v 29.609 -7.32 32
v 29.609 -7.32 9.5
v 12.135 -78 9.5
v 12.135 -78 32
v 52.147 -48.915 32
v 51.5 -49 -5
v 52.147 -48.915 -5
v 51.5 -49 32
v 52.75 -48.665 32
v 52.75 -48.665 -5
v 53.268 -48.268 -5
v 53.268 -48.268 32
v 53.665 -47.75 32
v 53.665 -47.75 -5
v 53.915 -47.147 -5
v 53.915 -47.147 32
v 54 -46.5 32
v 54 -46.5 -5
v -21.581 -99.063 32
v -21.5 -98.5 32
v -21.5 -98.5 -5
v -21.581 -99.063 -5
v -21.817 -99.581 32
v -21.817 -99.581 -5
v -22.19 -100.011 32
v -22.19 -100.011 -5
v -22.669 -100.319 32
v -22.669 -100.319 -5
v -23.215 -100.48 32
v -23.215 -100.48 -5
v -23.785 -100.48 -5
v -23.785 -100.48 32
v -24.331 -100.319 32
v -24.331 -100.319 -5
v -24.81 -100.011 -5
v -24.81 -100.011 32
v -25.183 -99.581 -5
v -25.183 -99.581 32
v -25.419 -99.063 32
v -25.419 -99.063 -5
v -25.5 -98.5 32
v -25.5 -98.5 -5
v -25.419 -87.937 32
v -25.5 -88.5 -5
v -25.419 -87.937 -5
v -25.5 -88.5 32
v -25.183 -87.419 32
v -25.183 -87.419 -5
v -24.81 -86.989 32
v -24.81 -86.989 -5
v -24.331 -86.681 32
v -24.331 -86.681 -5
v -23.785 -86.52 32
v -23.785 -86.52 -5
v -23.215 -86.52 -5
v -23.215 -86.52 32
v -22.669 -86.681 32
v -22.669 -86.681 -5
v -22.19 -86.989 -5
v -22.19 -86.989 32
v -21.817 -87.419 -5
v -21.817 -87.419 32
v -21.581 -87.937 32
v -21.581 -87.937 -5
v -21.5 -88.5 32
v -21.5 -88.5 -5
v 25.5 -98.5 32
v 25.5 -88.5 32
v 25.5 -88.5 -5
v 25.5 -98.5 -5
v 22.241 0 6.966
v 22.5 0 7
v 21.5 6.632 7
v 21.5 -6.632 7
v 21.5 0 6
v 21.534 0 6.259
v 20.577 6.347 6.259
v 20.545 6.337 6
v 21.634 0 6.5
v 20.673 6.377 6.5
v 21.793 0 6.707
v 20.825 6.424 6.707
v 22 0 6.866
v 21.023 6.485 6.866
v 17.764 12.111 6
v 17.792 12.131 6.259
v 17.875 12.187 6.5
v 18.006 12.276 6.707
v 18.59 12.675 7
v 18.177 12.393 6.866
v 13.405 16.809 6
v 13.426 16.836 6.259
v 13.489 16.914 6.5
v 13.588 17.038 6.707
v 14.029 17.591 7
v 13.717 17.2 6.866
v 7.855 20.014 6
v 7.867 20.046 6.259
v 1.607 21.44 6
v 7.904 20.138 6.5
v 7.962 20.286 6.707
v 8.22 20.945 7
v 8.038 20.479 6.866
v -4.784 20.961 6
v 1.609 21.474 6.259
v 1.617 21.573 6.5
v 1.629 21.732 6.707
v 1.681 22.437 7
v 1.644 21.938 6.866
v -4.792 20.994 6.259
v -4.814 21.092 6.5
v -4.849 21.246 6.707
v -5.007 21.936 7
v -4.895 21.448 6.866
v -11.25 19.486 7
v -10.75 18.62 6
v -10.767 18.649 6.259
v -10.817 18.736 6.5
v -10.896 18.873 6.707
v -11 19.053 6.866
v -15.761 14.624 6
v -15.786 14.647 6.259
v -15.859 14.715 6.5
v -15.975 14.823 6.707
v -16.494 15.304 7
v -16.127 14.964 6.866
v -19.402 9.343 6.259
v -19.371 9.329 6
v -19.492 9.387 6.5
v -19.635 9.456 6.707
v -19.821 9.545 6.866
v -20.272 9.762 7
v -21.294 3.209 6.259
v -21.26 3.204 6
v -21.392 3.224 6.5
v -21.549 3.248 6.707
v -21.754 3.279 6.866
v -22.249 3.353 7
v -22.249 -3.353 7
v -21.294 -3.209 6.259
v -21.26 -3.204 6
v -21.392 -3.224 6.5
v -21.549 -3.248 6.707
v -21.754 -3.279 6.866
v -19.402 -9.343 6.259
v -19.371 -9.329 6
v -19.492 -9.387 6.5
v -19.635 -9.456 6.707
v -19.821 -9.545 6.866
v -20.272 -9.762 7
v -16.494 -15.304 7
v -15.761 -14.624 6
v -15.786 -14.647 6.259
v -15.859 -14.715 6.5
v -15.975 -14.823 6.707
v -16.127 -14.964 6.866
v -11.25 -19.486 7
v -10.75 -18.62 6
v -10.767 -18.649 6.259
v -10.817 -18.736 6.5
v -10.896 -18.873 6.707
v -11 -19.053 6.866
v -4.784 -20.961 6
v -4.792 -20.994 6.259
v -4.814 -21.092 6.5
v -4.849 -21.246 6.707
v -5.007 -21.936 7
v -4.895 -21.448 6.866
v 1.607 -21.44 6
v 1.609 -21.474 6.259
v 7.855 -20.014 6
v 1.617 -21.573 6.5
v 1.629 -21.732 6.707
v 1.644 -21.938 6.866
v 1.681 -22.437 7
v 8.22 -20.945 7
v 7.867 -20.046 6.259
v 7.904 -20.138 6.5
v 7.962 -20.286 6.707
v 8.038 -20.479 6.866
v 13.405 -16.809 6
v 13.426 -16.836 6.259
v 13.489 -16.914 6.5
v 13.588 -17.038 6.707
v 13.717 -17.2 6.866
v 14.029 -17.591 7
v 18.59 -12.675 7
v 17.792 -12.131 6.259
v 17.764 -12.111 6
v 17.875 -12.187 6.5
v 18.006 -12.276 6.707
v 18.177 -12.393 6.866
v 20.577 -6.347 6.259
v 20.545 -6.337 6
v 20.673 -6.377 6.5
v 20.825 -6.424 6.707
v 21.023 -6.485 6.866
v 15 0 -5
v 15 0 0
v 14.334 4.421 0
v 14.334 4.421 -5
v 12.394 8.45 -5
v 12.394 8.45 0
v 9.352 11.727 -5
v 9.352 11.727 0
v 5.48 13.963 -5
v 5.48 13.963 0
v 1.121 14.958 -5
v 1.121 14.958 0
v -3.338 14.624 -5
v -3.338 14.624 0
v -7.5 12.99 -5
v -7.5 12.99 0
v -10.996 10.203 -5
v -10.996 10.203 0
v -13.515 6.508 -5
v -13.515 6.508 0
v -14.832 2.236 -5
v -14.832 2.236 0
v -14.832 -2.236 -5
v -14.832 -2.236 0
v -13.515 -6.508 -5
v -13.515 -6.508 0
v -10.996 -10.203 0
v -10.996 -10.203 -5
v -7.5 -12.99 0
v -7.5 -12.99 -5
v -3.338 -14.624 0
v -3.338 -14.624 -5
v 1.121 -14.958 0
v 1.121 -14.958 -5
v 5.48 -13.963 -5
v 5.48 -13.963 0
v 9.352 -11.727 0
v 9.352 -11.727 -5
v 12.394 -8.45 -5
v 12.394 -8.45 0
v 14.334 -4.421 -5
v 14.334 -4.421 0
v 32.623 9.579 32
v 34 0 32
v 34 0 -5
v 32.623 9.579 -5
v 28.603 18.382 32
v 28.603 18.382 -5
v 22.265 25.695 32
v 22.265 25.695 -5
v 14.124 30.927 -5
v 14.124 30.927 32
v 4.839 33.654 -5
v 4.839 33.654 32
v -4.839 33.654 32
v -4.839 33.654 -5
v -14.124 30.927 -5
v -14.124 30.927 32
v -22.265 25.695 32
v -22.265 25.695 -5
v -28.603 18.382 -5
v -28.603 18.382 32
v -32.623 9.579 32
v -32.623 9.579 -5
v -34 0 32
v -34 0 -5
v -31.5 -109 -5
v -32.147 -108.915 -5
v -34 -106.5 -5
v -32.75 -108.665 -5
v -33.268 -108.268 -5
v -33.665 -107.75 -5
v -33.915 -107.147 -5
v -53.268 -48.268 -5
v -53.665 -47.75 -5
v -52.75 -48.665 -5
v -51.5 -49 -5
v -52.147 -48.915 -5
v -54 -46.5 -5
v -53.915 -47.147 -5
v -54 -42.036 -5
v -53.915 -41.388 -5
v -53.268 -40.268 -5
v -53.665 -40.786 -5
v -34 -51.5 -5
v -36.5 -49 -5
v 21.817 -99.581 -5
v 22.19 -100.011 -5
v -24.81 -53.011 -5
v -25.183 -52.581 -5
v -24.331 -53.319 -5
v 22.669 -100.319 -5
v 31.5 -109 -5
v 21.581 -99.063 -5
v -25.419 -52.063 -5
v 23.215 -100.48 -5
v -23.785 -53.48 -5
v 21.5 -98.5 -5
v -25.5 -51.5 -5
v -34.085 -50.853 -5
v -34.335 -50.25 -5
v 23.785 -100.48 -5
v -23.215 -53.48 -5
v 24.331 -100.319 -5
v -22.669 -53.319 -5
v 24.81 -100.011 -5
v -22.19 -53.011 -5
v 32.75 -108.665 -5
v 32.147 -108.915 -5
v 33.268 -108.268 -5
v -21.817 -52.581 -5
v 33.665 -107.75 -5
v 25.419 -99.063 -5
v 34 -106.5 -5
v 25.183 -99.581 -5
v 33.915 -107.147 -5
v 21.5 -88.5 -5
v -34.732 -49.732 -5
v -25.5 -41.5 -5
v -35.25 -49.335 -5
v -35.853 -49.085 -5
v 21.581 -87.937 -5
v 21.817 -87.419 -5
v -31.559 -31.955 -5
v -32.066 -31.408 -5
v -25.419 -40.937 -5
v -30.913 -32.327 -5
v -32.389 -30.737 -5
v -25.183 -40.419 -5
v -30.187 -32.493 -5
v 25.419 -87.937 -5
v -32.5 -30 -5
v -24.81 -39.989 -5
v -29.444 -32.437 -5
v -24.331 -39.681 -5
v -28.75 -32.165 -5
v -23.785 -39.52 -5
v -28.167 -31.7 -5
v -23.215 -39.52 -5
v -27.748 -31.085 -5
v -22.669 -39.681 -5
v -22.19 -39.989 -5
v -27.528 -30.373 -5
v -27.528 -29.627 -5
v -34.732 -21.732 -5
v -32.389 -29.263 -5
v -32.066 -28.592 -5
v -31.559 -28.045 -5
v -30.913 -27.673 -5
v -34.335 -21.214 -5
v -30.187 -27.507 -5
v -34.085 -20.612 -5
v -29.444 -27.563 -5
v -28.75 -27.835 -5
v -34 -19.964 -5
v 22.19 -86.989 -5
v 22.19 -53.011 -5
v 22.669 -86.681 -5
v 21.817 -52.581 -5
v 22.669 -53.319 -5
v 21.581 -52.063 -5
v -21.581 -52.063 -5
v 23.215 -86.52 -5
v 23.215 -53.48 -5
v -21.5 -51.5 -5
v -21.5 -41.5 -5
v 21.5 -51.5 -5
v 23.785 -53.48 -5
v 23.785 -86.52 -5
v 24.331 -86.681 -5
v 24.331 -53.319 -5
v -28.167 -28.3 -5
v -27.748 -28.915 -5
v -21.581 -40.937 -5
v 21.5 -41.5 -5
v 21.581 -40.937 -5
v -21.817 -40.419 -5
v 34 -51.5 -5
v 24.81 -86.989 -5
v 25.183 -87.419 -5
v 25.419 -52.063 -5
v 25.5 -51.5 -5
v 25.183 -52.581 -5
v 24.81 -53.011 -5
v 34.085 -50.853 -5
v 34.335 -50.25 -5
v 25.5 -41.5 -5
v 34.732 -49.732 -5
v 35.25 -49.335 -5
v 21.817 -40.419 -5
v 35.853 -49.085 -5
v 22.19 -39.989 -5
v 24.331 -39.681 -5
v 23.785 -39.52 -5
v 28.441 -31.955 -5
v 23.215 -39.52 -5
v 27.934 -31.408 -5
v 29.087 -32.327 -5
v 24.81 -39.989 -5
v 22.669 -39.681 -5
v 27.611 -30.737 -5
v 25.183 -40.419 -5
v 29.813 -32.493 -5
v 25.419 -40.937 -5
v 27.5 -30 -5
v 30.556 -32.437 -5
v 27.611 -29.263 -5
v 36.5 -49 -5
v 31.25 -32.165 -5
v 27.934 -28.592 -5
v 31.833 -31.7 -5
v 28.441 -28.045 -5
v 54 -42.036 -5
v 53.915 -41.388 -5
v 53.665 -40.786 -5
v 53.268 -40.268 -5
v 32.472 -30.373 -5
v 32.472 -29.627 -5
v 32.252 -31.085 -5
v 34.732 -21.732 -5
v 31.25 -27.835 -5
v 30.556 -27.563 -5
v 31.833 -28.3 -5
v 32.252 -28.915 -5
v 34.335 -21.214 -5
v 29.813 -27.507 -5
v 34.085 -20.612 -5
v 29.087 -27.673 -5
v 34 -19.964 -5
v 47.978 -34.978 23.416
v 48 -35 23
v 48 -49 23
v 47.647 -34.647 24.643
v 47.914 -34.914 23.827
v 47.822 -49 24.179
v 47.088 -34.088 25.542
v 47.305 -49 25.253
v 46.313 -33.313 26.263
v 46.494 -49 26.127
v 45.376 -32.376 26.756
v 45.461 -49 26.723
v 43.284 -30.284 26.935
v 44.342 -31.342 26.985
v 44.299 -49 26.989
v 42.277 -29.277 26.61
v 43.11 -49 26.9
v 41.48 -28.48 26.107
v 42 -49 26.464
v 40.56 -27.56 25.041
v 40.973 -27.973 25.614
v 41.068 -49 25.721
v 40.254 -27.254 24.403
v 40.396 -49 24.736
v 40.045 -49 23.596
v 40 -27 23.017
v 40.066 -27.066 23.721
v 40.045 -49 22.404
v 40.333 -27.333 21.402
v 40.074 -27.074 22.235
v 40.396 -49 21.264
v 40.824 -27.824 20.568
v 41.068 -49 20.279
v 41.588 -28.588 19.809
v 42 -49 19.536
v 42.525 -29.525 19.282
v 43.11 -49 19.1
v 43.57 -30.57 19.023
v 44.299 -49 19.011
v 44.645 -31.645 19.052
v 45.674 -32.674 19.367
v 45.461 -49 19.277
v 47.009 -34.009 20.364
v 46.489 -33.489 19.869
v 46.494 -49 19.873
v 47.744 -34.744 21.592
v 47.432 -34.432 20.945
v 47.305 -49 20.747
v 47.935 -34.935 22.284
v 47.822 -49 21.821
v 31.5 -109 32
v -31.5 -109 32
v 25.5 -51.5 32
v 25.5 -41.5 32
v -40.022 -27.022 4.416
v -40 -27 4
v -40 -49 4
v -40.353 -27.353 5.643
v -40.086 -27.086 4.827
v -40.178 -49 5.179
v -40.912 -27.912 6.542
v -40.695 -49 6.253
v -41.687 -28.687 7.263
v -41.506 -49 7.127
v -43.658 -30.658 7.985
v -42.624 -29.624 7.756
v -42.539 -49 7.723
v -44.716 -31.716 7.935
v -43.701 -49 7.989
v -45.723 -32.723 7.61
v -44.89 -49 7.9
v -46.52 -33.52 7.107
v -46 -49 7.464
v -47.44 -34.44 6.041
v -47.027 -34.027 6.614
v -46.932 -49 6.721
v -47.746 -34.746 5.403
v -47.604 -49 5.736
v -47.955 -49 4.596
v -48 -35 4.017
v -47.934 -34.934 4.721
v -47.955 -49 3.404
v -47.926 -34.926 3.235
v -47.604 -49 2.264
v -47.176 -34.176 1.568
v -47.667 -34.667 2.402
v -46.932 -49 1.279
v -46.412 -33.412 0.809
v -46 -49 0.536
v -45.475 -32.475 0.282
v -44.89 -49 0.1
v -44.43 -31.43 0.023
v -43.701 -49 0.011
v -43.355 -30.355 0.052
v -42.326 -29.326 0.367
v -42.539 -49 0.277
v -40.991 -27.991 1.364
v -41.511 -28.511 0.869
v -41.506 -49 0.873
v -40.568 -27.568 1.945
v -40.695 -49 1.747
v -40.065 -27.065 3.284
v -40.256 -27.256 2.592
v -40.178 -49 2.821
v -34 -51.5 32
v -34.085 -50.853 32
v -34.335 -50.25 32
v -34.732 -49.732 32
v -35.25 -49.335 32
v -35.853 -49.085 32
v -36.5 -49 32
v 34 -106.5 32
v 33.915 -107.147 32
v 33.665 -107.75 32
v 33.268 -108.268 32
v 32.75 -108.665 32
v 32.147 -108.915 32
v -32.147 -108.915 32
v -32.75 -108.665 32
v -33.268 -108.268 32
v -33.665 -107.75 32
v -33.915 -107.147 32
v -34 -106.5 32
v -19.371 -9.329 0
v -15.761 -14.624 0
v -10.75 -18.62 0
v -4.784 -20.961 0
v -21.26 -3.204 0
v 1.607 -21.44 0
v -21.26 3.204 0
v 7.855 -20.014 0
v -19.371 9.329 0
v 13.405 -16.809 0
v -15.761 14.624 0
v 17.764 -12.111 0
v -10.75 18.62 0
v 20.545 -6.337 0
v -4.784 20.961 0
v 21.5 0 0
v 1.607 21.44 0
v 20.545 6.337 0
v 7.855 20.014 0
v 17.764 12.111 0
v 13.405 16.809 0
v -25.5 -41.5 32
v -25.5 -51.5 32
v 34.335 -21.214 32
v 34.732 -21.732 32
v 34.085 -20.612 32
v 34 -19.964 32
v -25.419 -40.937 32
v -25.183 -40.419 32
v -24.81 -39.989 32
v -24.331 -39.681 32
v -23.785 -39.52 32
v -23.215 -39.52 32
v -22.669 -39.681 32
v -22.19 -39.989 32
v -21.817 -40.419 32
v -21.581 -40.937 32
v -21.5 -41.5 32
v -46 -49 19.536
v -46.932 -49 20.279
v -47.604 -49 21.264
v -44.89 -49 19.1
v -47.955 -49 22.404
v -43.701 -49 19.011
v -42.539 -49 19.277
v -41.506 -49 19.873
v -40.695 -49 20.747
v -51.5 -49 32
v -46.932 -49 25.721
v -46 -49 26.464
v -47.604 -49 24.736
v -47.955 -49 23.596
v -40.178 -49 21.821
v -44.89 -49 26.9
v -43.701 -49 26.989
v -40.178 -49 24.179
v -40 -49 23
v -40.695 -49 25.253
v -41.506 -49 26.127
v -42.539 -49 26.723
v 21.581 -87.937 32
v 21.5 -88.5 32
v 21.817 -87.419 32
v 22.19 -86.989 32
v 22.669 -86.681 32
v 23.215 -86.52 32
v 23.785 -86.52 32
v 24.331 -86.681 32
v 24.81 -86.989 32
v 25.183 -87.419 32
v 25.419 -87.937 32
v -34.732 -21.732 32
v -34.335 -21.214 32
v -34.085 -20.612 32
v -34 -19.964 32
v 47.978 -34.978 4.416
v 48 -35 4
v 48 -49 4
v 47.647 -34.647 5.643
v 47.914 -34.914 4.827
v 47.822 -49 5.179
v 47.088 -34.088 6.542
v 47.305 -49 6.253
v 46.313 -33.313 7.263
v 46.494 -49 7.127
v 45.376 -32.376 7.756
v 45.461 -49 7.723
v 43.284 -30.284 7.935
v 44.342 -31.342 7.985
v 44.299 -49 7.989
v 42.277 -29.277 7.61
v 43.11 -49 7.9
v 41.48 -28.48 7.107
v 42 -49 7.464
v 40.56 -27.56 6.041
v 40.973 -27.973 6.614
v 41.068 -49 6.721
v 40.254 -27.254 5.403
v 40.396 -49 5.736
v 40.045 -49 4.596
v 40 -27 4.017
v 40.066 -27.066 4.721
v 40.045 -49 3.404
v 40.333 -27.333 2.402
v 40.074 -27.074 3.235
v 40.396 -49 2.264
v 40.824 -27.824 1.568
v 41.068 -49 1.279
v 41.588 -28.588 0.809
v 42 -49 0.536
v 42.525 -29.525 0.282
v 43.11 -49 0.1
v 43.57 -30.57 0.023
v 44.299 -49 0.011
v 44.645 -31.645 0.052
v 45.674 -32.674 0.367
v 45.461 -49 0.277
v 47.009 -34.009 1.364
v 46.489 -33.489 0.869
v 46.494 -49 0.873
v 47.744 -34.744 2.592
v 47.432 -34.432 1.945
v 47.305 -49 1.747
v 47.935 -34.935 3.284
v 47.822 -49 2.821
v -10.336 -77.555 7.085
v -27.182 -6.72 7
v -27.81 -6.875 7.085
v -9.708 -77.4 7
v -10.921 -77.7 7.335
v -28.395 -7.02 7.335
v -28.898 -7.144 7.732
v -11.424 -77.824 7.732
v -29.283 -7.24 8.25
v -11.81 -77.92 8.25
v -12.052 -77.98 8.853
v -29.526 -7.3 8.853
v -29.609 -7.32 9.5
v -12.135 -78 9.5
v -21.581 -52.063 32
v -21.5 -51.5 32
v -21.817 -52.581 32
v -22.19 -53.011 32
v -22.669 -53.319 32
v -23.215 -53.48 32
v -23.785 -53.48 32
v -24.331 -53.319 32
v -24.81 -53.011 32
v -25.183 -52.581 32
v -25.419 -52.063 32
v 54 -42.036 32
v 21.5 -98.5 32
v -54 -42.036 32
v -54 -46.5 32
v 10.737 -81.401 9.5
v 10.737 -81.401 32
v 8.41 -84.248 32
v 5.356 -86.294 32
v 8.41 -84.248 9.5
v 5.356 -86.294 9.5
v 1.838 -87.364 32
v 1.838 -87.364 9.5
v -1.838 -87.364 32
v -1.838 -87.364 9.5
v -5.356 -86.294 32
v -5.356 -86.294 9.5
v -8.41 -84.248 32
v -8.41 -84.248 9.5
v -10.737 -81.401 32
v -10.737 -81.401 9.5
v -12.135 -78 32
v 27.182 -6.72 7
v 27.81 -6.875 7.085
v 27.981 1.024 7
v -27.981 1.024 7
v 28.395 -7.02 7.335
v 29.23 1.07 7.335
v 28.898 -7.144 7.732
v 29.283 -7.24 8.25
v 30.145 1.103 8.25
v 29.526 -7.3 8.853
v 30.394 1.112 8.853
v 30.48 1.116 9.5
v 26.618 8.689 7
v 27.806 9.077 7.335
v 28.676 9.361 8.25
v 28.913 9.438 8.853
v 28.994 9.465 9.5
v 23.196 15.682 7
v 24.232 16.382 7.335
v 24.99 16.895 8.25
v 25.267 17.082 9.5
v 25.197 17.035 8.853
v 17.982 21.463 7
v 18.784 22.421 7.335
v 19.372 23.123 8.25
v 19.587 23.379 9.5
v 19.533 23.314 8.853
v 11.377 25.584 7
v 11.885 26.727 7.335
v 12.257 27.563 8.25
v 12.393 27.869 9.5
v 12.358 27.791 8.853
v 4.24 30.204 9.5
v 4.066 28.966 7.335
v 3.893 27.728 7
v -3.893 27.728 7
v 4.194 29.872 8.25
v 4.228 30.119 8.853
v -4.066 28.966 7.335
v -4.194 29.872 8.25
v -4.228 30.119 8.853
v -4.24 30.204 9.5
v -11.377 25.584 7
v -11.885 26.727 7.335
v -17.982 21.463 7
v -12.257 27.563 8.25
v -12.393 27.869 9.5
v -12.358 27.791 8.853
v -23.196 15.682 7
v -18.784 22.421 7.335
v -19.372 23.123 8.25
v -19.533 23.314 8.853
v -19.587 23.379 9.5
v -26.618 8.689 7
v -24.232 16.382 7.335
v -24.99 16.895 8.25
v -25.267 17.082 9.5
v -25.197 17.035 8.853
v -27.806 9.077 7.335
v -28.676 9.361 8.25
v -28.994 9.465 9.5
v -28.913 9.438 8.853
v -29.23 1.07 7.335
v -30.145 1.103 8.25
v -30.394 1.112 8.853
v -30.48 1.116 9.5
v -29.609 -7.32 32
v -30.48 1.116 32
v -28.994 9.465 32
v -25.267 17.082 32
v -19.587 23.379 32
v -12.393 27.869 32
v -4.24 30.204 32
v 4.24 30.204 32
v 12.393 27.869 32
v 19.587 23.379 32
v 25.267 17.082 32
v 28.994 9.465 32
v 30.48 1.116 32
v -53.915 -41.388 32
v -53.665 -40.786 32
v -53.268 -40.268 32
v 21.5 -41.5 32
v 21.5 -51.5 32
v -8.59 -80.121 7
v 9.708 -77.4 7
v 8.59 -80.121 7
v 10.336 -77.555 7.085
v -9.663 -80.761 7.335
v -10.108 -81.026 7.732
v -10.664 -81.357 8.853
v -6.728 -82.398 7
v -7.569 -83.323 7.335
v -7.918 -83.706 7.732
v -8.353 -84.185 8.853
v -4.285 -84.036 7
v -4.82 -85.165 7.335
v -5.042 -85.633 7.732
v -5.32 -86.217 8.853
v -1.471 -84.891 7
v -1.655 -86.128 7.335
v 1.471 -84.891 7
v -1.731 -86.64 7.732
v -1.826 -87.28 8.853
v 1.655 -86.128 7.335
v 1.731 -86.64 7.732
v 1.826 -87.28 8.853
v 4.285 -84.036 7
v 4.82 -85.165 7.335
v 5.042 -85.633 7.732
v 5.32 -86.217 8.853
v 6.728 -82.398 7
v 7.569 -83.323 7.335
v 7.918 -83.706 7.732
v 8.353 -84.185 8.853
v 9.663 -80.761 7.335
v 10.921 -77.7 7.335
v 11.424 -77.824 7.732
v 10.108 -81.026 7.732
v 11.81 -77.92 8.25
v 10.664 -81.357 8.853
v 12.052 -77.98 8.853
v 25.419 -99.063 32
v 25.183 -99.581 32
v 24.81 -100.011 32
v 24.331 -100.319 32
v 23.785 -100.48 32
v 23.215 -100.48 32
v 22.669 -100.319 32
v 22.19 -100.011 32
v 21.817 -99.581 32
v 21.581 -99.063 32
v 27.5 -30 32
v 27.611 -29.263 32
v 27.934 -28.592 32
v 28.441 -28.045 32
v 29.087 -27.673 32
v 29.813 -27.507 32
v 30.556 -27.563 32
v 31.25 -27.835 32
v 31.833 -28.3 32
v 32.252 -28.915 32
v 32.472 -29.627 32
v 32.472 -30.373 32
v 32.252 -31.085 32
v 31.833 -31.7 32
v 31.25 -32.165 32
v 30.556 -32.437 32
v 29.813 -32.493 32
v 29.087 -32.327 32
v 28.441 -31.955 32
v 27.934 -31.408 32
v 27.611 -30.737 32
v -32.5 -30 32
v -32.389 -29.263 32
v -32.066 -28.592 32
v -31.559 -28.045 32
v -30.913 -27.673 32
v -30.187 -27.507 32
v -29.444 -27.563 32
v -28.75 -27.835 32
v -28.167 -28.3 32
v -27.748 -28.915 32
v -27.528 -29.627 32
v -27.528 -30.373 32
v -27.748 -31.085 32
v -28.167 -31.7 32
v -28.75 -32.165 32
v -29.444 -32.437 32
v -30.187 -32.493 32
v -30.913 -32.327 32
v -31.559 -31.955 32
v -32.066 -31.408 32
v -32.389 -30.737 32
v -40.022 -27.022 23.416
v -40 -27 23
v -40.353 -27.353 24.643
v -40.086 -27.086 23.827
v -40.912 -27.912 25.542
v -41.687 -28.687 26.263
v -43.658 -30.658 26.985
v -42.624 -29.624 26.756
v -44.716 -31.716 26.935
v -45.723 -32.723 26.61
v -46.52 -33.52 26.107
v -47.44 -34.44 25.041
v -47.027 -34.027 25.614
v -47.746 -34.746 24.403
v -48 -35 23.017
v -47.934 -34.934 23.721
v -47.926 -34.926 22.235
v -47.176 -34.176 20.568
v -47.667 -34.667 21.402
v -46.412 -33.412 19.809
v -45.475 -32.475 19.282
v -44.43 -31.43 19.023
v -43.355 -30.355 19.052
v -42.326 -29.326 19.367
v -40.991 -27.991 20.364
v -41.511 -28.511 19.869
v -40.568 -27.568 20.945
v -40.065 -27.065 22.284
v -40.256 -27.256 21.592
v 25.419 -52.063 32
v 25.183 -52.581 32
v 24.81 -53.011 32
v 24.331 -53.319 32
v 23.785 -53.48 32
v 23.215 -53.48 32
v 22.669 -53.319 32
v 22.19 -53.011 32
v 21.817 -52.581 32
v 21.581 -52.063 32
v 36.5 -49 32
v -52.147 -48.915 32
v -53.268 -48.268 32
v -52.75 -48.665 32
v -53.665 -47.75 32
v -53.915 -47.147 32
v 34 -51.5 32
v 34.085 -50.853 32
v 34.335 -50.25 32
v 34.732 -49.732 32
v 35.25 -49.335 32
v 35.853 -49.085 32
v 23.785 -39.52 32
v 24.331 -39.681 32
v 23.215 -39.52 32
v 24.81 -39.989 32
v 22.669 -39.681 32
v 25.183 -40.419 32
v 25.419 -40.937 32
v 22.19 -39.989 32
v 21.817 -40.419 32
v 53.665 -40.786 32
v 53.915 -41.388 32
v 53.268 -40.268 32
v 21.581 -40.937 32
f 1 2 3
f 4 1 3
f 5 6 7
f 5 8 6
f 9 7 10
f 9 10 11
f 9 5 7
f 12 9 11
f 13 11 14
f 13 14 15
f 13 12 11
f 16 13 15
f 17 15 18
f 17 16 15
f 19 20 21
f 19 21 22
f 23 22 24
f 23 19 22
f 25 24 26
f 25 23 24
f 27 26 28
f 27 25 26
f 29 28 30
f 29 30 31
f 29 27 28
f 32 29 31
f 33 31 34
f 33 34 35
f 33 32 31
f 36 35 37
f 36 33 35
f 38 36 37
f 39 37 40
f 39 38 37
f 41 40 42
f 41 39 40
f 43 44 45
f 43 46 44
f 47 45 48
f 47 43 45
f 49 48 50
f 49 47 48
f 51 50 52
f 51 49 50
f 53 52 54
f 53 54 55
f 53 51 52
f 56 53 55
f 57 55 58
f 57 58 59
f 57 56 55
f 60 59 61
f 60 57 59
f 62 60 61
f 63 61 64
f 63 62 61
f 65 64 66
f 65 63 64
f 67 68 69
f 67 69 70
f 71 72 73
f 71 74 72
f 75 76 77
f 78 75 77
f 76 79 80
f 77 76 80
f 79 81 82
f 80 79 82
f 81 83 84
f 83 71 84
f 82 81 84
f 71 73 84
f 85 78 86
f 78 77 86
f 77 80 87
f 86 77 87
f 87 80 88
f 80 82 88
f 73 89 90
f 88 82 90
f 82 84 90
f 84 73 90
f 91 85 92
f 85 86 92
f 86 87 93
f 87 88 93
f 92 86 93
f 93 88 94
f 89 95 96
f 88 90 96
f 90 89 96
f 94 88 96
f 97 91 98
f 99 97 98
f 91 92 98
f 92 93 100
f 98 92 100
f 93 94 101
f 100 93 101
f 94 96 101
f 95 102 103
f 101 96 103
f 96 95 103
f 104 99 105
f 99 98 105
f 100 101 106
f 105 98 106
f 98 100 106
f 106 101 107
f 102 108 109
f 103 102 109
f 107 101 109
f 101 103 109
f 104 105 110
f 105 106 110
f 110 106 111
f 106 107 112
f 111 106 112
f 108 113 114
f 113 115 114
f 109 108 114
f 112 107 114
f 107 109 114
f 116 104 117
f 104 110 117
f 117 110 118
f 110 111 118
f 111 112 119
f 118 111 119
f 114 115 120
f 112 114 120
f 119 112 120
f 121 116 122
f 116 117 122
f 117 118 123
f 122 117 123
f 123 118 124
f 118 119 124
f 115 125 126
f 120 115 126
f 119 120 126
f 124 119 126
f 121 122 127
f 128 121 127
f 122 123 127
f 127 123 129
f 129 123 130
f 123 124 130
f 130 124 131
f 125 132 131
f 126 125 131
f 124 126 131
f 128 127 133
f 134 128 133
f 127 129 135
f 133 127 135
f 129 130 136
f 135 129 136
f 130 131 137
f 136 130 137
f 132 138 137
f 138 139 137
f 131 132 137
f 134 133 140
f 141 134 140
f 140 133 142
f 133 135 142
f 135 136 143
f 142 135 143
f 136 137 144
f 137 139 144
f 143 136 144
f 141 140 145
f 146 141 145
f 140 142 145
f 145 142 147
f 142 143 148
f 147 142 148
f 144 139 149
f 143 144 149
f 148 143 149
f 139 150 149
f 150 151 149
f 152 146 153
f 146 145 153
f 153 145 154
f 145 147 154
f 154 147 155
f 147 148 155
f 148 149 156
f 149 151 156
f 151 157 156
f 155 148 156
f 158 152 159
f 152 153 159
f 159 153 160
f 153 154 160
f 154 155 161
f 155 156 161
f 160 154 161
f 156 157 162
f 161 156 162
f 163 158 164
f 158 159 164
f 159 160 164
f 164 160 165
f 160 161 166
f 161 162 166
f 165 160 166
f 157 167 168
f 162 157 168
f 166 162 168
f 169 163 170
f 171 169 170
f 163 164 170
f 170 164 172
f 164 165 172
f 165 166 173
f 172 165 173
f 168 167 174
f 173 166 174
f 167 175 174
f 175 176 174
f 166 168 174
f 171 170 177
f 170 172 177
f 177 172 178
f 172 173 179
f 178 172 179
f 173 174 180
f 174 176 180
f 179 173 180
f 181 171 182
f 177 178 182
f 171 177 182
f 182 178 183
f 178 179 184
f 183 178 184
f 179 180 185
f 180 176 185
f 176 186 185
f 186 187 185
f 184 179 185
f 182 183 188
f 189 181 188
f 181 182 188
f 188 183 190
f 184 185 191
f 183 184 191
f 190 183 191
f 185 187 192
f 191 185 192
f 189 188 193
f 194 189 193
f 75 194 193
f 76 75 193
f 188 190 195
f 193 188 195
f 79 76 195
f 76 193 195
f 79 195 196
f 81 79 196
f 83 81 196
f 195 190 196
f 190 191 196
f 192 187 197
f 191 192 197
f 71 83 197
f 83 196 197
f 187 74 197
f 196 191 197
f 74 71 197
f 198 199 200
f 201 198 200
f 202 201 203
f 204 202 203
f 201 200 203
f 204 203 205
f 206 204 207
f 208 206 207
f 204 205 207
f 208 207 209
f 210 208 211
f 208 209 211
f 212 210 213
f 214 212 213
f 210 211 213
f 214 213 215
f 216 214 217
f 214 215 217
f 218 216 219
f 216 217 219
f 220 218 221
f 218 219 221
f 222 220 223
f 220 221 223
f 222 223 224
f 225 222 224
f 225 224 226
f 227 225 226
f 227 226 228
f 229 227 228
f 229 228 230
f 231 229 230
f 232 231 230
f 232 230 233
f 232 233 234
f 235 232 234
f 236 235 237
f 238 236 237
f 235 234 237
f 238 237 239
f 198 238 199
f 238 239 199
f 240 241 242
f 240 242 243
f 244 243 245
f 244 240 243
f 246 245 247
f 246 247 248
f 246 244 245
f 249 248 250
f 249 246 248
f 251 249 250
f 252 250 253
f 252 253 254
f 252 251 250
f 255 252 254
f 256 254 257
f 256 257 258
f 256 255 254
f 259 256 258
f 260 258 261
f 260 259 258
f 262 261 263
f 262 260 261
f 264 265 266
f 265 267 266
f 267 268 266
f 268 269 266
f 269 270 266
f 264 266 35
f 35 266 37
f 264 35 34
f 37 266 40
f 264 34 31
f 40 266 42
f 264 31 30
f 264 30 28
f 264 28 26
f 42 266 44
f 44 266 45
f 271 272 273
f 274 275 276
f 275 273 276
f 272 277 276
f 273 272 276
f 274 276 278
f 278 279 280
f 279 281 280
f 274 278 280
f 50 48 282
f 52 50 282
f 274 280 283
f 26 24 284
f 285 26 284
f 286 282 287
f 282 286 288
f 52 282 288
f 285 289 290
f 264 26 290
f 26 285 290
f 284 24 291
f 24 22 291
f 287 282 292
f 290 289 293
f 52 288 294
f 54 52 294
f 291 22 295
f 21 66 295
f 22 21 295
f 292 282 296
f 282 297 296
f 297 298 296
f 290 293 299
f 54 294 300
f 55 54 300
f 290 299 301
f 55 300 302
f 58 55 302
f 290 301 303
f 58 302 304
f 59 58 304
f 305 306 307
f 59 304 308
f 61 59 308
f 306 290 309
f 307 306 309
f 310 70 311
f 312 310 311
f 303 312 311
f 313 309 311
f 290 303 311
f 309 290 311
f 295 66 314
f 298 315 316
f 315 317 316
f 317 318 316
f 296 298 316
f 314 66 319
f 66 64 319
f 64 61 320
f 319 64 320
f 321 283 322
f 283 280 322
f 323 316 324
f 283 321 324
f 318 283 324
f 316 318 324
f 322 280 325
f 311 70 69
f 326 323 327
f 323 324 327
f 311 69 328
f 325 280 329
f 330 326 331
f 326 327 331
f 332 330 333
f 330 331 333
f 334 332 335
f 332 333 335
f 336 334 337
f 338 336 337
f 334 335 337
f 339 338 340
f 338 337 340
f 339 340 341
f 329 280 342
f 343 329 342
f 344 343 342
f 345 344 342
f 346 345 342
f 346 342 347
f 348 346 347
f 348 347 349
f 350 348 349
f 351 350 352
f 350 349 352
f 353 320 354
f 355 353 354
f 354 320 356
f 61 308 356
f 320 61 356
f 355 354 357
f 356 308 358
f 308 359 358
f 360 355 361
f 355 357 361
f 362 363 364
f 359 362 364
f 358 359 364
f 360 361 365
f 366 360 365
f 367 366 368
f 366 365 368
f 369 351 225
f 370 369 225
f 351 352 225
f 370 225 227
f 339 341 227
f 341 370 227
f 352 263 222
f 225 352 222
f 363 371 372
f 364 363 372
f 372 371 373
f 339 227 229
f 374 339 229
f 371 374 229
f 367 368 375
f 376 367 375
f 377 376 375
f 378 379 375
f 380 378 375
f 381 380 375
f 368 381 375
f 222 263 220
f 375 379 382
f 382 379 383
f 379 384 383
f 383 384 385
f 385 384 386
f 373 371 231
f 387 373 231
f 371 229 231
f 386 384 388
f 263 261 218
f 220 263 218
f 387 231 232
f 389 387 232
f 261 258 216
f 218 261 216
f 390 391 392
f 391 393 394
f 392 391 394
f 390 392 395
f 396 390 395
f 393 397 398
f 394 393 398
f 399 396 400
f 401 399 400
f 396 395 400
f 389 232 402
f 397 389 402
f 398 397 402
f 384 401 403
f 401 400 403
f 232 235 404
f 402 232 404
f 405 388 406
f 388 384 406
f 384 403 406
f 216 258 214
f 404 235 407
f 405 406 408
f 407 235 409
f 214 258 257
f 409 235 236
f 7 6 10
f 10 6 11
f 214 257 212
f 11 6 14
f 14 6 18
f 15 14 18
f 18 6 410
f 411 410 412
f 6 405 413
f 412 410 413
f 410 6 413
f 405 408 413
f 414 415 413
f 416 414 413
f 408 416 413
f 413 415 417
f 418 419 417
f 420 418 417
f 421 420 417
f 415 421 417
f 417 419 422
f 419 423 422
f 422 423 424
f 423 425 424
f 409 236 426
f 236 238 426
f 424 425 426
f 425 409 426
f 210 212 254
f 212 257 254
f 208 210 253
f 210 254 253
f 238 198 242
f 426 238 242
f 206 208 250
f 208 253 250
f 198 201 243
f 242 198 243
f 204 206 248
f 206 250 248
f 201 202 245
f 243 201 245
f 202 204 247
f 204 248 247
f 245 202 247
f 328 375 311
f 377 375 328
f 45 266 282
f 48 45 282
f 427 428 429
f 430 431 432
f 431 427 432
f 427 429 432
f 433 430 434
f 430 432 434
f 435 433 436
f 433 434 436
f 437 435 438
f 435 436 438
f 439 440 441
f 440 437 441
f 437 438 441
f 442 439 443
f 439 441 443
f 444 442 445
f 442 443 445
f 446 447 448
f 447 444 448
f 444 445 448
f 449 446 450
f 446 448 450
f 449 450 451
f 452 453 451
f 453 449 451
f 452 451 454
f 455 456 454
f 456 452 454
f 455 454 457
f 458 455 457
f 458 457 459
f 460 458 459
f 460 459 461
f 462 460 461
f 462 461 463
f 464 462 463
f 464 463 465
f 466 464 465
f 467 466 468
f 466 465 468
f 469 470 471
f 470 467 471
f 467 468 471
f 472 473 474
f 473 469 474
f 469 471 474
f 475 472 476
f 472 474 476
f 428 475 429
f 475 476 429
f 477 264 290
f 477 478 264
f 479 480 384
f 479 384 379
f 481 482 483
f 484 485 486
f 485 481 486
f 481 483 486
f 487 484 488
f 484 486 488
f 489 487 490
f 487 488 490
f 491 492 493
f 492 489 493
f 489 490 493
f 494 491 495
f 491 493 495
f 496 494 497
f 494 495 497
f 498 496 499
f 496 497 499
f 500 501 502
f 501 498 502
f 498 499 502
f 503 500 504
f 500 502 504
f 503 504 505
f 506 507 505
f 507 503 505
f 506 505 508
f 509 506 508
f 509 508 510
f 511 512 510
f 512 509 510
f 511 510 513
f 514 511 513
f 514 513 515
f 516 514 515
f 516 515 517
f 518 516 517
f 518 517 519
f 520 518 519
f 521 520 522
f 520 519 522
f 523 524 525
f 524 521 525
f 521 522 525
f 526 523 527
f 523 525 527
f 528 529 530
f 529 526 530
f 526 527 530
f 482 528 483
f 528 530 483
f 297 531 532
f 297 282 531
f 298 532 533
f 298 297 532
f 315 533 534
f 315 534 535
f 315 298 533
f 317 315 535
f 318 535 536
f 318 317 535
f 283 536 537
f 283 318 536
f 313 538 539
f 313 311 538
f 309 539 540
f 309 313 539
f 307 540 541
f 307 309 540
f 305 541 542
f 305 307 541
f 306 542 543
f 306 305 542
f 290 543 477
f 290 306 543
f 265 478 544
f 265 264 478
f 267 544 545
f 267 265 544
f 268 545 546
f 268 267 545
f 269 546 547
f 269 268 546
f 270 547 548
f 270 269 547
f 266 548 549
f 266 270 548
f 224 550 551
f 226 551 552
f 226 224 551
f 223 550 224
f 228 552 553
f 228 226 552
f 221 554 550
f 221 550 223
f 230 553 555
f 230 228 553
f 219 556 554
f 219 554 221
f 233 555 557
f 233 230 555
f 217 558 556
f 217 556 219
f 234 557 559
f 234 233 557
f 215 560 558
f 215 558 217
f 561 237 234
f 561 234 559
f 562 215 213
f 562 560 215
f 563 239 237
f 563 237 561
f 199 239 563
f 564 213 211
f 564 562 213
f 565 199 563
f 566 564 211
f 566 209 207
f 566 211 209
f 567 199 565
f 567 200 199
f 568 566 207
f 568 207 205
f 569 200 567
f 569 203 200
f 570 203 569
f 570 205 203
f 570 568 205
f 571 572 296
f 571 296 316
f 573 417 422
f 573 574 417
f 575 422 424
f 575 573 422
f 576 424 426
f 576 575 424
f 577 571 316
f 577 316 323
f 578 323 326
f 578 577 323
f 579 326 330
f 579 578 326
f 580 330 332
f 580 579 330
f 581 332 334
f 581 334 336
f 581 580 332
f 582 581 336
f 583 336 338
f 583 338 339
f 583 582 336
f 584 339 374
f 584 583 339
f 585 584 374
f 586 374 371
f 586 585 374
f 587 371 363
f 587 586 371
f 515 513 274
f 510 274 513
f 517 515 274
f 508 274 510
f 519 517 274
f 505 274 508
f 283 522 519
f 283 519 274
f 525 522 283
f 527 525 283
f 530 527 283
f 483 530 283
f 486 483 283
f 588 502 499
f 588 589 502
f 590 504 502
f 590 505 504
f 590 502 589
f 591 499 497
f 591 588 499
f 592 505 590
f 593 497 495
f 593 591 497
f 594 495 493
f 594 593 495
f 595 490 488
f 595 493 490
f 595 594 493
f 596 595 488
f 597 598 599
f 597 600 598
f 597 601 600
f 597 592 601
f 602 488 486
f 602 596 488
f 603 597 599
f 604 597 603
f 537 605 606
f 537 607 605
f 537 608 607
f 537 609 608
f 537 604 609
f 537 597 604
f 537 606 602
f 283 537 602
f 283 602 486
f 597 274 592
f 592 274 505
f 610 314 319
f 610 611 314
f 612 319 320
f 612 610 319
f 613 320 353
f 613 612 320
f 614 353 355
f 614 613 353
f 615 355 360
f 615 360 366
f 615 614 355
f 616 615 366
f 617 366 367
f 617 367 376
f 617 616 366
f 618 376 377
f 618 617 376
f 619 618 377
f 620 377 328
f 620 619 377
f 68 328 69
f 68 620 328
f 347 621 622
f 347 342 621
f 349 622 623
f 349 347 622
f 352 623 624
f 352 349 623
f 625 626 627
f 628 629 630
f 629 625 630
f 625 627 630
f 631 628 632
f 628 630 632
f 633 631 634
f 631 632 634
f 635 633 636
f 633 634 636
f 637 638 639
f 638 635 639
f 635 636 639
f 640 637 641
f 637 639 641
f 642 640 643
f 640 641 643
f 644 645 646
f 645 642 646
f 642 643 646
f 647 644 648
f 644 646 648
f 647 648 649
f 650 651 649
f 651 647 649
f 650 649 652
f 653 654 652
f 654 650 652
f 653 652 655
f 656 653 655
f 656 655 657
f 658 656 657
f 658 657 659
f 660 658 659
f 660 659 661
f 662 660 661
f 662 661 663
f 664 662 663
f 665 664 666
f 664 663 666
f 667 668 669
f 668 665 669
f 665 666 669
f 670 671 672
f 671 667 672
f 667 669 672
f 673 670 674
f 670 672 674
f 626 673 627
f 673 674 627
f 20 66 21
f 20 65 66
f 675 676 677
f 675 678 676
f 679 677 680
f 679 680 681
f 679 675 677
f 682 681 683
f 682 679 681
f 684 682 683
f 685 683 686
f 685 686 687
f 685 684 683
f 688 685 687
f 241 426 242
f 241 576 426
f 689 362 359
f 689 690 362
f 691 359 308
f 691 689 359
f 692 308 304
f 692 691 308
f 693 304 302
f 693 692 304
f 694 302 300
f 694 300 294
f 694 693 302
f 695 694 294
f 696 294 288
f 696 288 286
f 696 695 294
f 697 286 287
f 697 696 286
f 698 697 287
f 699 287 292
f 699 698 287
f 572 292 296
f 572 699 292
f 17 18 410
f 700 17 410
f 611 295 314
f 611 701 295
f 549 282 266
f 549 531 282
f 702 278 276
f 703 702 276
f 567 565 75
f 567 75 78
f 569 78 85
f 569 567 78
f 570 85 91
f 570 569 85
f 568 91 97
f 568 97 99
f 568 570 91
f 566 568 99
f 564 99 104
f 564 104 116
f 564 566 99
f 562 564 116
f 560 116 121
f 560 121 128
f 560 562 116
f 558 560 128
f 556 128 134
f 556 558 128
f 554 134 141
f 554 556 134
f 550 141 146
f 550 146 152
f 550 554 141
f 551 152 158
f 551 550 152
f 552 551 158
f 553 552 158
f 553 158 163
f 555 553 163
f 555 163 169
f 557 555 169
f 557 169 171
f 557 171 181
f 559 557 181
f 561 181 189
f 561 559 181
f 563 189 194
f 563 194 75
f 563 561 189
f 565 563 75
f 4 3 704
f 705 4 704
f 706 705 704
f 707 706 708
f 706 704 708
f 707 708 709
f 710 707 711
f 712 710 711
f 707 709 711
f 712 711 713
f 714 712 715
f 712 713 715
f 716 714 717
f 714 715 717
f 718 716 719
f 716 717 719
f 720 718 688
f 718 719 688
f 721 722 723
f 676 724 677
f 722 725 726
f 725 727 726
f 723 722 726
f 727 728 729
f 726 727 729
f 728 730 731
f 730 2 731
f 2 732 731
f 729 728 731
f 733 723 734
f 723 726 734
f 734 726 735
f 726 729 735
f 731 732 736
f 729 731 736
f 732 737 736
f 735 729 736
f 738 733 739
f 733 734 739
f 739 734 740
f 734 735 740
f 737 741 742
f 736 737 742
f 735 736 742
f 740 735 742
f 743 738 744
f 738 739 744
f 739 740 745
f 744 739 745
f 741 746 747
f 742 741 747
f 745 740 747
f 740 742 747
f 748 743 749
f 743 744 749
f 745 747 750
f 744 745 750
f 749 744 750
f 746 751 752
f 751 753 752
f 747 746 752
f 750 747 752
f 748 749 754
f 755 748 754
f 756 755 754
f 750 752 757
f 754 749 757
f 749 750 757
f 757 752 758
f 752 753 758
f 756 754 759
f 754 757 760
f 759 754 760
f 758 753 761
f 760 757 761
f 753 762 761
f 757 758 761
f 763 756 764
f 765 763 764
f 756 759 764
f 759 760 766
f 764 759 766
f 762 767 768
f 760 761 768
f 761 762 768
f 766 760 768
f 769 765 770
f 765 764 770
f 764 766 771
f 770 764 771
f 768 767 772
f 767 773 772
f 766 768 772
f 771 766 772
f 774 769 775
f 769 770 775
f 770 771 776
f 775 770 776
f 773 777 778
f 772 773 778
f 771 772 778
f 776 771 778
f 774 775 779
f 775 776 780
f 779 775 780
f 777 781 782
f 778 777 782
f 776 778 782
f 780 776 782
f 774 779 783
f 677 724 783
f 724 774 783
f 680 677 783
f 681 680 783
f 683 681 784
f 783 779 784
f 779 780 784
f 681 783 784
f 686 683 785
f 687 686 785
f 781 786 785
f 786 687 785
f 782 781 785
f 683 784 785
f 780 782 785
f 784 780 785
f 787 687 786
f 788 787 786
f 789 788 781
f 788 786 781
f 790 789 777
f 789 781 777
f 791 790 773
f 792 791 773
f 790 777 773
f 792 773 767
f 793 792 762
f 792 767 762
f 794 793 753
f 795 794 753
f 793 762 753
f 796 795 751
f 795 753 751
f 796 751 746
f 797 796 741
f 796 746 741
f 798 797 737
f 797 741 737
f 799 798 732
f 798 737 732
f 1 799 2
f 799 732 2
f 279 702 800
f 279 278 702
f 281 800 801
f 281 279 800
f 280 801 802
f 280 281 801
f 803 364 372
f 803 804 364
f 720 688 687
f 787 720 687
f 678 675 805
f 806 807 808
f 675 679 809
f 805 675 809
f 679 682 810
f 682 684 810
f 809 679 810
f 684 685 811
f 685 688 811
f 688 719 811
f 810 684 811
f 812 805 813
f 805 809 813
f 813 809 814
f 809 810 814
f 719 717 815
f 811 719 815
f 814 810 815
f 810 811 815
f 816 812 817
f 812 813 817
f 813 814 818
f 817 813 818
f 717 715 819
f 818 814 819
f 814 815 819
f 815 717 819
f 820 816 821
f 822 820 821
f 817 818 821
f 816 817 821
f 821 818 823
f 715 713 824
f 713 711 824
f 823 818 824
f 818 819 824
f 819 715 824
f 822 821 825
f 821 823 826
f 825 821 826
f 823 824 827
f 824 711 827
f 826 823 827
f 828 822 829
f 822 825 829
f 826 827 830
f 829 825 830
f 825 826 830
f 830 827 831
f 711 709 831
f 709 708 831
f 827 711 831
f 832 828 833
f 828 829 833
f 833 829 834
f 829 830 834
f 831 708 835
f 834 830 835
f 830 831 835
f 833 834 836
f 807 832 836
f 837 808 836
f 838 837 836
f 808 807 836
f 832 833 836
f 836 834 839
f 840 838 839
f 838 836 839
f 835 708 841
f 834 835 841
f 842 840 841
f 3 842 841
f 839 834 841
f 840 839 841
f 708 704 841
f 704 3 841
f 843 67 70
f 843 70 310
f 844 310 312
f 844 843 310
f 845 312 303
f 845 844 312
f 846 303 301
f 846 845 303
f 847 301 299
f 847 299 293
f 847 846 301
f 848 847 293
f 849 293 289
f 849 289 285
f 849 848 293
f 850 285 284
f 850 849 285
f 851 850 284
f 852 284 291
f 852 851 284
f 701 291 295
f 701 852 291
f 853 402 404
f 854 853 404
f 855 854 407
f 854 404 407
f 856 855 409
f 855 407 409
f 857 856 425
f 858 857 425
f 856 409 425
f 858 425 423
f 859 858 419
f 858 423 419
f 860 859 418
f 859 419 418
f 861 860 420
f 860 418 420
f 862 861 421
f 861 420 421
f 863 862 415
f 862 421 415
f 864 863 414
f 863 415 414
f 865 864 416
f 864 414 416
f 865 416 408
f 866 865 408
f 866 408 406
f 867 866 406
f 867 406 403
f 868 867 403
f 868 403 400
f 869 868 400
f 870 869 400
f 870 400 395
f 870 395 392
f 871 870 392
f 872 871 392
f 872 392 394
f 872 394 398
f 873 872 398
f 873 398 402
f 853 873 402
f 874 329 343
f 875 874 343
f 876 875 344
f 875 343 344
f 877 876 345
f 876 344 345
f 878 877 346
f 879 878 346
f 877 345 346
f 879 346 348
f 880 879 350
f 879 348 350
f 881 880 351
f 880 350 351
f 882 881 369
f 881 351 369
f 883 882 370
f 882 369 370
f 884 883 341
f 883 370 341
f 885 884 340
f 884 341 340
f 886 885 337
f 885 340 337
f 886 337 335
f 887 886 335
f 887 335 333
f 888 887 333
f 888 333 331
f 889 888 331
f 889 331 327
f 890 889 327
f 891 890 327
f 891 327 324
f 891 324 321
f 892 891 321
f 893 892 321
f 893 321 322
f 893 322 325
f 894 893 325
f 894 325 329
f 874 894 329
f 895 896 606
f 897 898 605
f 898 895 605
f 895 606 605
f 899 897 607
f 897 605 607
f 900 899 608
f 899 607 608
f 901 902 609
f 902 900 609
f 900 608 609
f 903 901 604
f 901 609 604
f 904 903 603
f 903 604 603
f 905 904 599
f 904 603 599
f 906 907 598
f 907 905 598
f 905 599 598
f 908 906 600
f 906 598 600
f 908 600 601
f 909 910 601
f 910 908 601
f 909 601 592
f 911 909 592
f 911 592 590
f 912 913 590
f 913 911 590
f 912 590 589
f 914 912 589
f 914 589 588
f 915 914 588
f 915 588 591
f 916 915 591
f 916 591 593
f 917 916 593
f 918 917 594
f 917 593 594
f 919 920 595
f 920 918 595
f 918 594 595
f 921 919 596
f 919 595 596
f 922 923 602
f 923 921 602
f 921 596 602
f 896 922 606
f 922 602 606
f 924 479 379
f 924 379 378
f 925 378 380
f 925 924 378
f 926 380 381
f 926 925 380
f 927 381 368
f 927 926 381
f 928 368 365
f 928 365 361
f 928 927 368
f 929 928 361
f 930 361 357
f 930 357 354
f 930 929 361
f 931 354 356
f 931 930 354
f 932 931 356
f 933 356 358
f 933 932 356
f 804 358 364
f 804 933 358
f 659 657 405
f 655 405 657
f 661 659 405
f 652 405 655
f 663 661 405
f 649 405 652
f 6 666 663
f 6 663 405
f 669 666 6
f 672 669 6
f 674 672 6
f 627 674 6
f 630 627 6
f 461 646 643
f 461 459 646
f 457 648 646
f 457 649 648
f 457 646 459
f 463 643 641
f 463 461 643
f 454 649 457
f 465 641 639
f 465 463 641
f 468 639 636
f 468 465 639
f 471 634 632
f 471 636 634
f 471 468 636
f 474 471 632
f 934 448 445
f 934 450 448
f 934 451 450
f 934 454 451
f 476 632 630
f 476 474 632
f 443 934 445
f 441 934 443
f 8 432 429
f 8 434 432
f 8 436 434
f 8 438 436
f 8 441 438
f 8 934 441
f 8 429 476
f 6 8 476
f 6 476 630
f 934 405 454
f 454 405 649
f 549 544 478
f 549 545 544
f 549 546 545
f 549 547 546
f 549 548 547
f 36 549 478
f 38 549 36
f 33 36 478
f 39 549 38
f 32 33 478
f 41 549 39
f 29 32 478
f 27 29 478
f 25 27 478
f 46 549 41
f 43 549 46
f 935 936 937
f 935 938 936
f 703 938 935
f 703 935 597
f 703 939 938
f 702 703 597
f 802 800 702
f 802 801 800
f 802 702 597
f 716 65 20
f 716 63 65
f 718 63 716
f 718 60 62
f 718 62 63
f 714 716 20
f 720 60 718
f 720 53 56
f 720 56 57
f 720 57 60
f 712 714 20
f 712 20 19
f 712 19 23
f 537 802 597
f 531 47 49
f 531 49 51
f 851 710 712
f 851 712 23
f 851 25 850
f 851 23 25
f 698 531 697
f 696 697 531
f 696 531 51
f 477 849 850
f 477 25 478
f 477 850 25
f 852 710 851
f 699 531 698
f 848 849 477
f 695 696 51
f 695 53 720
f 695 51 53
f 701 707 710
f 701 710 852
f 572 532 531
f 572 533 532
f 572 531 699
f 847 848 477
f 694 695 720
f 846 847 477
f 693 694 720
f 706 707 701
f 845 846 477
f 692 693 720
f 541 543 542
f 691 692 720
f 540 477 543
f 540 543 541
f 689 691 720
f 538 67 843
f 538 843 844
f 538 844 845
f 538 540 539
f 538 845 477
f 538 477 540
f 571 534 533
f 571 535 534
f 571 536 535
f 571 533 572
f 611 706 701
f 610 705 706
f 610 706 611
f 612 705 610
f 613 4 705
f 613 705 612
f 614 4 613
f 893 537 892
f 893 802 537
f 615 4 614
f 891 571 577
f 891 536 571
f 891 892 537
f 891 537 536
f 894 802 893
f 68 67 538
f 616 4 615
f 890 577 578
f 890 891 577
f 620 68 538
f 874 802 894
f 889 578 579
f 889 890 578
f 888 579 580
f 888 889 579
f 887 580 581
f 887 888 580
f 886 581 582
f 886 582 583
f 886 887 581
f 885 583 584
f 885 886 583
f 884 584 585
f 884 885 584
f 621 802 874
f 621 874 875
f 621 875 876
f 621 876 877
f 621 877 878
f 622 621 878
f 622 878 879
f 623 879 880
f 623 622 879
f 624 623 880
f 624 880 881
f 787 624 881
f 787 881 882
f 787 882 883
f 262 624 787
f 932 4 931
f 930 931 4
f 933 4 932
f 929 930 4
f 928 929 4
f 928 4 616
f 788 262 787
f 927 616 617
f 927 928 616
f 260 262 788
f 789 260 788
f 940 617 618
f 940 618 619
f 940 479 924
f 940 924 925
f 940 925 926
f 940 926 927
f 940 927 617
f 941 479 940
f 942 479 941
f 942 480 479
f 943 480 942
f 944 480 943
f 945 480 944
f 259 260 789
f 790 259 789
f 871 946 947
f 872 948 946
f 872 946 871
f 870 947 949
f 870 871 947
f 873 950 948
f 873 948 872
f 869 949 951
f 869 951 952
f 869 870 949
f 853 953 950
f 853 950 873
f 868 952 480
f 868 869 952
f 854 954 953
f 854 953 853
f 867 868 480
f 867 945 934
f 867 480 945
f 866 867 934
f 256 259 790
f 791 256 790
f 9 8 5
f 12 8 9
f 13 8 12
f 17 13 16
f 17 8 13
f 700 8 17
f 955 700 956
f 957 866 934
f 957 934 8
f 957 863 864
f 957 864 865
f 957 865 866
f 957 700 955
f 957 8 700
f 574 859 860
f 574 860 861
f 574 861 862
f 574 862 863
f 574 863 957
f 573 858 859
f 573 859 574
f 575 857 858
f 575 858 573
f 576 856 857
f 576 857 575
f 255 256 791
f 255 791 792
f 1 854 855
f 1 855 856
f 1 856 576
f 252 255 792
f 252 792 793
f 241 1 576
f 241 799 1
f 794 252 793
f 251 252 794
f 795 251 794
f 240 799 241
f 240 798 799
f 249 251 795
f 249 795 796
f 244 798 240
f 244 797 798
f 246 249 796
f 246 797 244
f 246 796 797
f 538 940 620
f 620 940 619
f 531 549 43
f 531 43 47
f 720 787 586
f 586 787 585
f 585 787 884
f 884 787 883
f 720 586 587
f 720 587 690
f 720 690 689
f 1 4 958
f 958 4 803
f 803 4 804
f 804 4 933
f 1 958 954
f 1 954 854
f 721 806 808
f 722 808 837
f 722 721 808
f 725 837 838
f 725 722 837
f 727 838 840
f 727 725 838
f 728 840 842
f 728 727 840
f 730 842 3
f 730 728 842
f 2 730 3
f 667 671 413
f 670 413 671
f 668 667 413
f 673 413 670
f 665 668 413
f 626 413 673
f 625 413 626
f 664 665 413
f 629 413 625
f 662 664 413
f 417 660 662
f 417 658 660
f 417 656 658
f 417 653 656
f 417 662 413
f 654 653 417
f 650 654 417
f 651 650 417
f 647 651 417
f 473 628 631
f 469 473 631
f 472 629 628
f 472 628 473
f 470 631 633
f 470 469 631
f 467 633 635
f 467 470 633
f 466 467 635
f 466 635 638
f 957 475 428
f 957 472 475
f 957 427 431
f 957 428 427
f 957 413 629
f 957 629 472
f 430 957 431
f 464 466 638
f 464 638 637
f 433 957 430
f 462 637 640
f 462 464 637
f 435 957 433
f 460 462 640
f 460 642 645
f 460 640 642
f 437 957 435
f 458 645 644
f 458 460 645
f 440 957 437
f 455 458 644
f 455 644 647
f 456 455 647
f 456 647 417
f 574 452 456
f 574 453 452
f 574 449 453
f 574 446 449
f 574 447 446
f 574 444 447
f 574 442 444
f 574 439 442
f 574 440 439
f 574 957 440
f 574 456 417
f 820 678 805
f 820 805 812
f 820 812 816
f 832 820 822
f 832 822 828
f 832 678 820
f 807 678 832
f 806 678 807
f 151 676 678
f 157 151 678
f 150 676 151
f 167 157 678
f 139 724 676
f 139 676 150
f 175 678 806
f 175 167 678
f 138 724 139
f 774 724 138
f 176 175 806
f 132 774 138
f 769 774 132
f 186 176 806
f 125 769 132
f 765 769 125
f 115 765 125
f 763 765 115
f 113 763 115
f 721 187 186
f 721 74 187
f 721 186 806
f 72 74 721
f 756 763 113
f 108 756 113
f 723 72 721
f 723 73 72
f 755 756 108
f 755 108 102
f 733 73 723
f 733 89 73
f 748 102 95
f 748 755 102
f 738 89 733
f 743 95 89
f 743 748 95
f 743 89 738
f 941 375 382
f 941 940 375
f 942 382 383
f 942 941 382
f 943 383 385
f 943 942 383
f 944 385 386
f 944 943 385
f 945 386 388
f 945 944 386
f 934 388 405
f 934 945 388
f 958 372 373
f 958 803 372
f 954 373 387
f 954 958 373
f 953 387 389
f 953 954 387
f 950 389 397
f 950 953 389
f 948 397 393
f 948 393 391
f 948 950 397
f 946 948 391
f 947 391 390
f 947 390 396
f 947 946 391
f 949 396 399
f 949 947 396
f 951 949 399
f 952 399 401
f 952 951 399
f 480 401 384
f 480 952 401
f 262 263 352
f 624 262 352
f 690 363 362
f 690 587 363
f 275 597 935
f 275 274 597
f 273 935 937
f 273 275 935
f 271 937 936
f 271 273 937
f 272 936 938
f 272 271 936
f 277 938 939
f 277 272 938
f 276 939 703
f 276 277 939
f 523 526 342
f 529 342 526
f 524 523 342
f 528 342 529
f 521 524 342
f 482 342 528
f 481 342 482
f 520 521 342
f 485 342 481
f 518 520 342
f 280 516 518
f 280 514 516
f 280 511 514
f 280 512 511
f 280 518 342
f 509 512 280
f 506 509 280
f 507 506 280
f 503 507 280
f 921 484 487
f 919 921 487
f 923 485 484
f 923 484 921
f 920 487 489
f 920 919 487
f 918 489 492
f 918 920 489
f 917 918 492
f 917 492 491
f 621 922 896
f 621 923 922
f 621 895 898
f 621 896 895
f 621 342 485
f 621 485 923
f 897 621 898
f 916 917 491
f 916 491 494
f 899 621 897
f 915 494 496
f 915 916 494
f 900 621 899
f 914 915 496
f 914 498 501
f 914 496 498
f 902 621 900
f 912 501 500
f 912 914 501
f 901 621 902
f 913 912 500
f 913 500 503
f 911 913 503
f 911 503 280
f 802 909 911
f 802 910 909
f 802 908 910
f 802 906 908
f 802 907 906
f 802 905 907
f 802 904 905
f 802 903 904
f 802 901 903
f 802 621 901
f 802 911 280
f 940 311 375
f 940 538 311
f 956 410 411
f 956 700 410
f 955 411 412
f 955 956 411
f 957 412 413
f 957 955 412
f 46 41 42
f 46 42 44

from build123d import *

# Parameters (mm, degrees)
BOSS_EXTRU_1_DEPTH      = 32
ESQUISSE1_7_R           = 15
BOSS_EXTRU_3_DEPTH      = 5
ESQUISSE1_8_R           = 21.5
BOSS_EXTRU_4_DEPTH      = 7
CONG_2_R                = 1
CONG_3_R                = 2.5
ESQUISSE2_R             = 2.5
ENL_V_MAT_EXTRU_1_DEPTH = 38
CONG_4_R                = 2.5
ESQUISSE3_R             = 4
ENL_V_MAT_EXTRU_2_DEPTH = 84


with BuildPart() as part:
    # Esquisse1 → Boss.-Extru.1 (new body)
    with BuildSketch(Plane.XY):
        with BuildLine():
            Line((34, -109), (34, -49))
            Line((34, -49), (54, -49))
            Line((54, -49), (54, -41))
            Line((54, -41), (34, -21))
            Line((34, -21), (34, 0))
            ThreePointArc((34, 0), (0, 34), (-34, 0))
            Line((-34, 0), (-34, -21))
            Line((-34, -21), (-54, -41))
            Line((-54, -41), (-54, -49))
            Line((-54, -49), (-34, -49))
            Line((-34, -49), (-34, -109))
            Line((-34, -109), (34, -109))
        make_face()
        with BuildLine():
            ThreePointArc((-21.5, -98.5), (-23.5, -100.5), (-25.5, -98.5))
            Line((-25.5, -98.5), (-25.5, -88.5))
            ThreePointArc((-25.5, -88.5), (-23.5, -86.5), (-21.5, -88.5))
            Line((-21.5, -88.5), (-21.5, -98.5))
        make_face(mode=Mode.SUBTRACT)
        with BuildLine():
            Line((-25.5, -51.5), (-25.5, -41.5))
            ThreePointArc((-25.5, -41.5), (-23.5, -39.5), (-21.5, -41.5))
            Line((-21.5, -41.5), (-21.5, -51.5))
            ThreePointArc((-21.5, -51.5), (-23.5, -53.5), (-25.5, -51.5))
        make_face(mode=Mode.SUBTRACT)
        with BuildLine():
            Line((25.5, -88.5), (25.5, -98.5))
            ThreePointArc((25.5, -98.5), (23.5, -100.5), (21.5, -98.5))
            Line((21.5, -98.5), (21.5, -88.5))
            ThreePointArc((21.5, -88.5), (23.5, -86.5), (25.5, -88.5))
        make_face(mode=Mode.SUBTRACT)
        with BuildLine():
            Line((21.5, -51.5), (21.5, -41.5))
            ThreePointArc((21.5, -41.5), (23.5, -39.5), (25.5, -41.5))
            Line((25.5, -41.5), (25.5, -51.5))
            ThreePointArc((25.5, -51.5), (23.5, -53.5), (21.5, -51.5))
        make_face(mode=Mode.SUBTRACT)
        with BuildLine():
            ThreePointArc((-29.608573083, -7.32), (0, 30.5), (29.608573083, -7.32))
            Line((29.608573083, -7.32), (12.1346611, -78))
            ThreePointArc((12.1346611, -78), (0, -87.5), (-12.1346611, -78))
            Line((-12.1346611, -78), (-29.608573083, -7.32))
        make_face(mode=Mode.SUBTRACT)
    extrude(amount=BOSS_EXTRU_1_DEPTH)

    # Esquisse1<7> → Boss.-Extru.3 (add)
    with BuildSketch(Plane.XY):
        with BuildLine():
            Line((34, -109), (34, -49))
            Line((34, -49), (54, -49))
            Line((54, -49), (54, -41))
            Line((54, -41), (34, -21))
            Line((34, -21), (34, 0))
            ThreePointArc((34, 0), (0, 34), (-34, 0))
            Line((-34, 0), (-34, -21))
            Line((-34, -21), (-54, -41))
            Line((-54, -41), (-54, -49))
            Line((-54, -49), (-34, -49))
            Line((-34, -49), (-34, -109))
            Line((-34, -109), (34, -109))
        make_face()
        with BuildLine():
            ThreePointArc((-21.5, -98.5), (-23.5, -100.5), (-25.5, -98.5))
            Line((-25.5, -98.5), (-25.5, -88.5))
            ThreePointArc((-25.5, -88.5), (-23.5, -86.5), (-21.5, -88.5))
            Line((-21.5, -88.5), (-21.5, -98.5))
        make_face(mode=Mode.SUBTRACT)
        with BuildLine():
            Line((-25.5, -51.5), (-25.5, -41.5))
            ThreePointArc((-25.5, -41.5), (-23.5, -39.5), (-21.5, -41.5))
            Line((-21.5, -41.5), (-21.5, -51.5))
            ThreePointArc((-21.5, -51.5), (-23.5, -53.5), (-25.5, -51.5))
        make_face(mode=Mode.SUBTRACT)
        with BuildLine():
            Line((25.5, -88.5), (25.5, -98.5))
            ThreePointArc((25.5, -98.5), (23.5, -100.5), (21.5, -98.5))
            Line((21.5, -98.5), (21.5, -88.5))
            ThreePointArc((21.5, -88.5), (23.5, -86.5), (25.5, -88.5))
        make_face(mode=Mode.SUBTRACT)
        with BuildLine():
            Line((25.5, -41.5), (25.5, -51.5))
            ThreePointArc((25.5, -51.5), (23.5, -53.5), (21.5, -51.5))
            Line((21.5, -51.5), (21.5, -41.5))
            ThreePointArc((21.5, -41.5), (23.5, -39.5), (25.5, -41.5))
        make_face(mode=Mode.SUBTRACT)
        Circle(ESQUISSE1_7_R, mode=Mode.SUBTRACT)
    extrude(amount=-BOSS_EXTRU_3_DEPTH)

    # Esquisse1<8> → Boss.-Extru.4 (add)
    with BuildSketch(Plane.XY):
        with BuildLine():
            Line((-29.608573083, -7.32), (-12.1346611, -78))
            ThreePointArc((-12.1346611, -78), (0, -87.5), (12.1346611, -78))
            Line((12.1346611, -78), (29.608573083, -7.32))
            ThreePointArc((29.608573083, -7.32), (0, 30.5), (-29.608573083, -7.32))
        make_face()
        Circle(ESQUISSE1_8_R, mode=Mode.SUBTRACT)
    extrude(amount=BOSS_EXTRU_4_DEPTH)

    # Congé2
    cong_2_edges = [part.edges().sort_by_distance(p)[0] for p in [
        (-21.5, 0, 7),
    ]]
    fillet(cong_2_edges, radius=CONG_2_R)

    # Congé3
    cong_3_edges = [part.edges().sort_by_distance(p)[0] for p in [
        (-20.871617091, -42.66, 7),
        (0, -87.5, 7),
        (20.871617091, -42.66, 7),
        (0, 30.5, 7),
    ]]
    fillet(cong_3_edges, radius=CONG_3_R)

    # Esquisse2 → Enlèv. mat.-Extru.1 (cut, through all)
    with BuildSketch(Plane(origin=(0, 0, -5), x_dir=(-1, 0, 0), z_dir=(0, 0, -1))):
        with Locations((30, -30)):
            Circle(ESQUISSE2_R)
        with Locations((-30, -30)):
            Circle(ESQUISSE2_R)
    extrude(amount=-ENL_V_MAT_EXTRU_1_DEPTH, mode=Mode.SUBTRACT)

    # Congé4
    cong_4_edges = [part.edges().sort_by_distance(p)[0] for p in [
        (34, -109, 13.5),
        (-34, -109, 13.5),
        (-34, -49, 13.5),
        (-54, -49, 13.5),
        (-54, -41, 13.5),
        (-34, -21, 13.5),
        (34, -21, 13.5),
        (54, -41, 13.5),
        (54, -49, 13.5),
        (34, -49, 13.5),
    ]]
    fillet(cong_4_edges, radius=CONG_4_R)

    # Esquisse3 → Enlèv. mat.-Extru.2 (cut, through all)
    with BuildSketch(Plane.XZ.offset(49)):
        with Locations((-44, 4)):
            Circle(ESQUISSE3_R)
        with Locations((44, 4)):
            Circle(ESQUISSE3_R)
        with Locations((44, 23)):
            Circle(ESQUISSE3_R)
        with Locations((-44, 23)):
            Circle(ESQUISSE3_R)
    extrude(amount=-ENL_V_MAT_EXTRU_2_DEPTH, mode=Mode.SUBTRACT)


solid = part.part
